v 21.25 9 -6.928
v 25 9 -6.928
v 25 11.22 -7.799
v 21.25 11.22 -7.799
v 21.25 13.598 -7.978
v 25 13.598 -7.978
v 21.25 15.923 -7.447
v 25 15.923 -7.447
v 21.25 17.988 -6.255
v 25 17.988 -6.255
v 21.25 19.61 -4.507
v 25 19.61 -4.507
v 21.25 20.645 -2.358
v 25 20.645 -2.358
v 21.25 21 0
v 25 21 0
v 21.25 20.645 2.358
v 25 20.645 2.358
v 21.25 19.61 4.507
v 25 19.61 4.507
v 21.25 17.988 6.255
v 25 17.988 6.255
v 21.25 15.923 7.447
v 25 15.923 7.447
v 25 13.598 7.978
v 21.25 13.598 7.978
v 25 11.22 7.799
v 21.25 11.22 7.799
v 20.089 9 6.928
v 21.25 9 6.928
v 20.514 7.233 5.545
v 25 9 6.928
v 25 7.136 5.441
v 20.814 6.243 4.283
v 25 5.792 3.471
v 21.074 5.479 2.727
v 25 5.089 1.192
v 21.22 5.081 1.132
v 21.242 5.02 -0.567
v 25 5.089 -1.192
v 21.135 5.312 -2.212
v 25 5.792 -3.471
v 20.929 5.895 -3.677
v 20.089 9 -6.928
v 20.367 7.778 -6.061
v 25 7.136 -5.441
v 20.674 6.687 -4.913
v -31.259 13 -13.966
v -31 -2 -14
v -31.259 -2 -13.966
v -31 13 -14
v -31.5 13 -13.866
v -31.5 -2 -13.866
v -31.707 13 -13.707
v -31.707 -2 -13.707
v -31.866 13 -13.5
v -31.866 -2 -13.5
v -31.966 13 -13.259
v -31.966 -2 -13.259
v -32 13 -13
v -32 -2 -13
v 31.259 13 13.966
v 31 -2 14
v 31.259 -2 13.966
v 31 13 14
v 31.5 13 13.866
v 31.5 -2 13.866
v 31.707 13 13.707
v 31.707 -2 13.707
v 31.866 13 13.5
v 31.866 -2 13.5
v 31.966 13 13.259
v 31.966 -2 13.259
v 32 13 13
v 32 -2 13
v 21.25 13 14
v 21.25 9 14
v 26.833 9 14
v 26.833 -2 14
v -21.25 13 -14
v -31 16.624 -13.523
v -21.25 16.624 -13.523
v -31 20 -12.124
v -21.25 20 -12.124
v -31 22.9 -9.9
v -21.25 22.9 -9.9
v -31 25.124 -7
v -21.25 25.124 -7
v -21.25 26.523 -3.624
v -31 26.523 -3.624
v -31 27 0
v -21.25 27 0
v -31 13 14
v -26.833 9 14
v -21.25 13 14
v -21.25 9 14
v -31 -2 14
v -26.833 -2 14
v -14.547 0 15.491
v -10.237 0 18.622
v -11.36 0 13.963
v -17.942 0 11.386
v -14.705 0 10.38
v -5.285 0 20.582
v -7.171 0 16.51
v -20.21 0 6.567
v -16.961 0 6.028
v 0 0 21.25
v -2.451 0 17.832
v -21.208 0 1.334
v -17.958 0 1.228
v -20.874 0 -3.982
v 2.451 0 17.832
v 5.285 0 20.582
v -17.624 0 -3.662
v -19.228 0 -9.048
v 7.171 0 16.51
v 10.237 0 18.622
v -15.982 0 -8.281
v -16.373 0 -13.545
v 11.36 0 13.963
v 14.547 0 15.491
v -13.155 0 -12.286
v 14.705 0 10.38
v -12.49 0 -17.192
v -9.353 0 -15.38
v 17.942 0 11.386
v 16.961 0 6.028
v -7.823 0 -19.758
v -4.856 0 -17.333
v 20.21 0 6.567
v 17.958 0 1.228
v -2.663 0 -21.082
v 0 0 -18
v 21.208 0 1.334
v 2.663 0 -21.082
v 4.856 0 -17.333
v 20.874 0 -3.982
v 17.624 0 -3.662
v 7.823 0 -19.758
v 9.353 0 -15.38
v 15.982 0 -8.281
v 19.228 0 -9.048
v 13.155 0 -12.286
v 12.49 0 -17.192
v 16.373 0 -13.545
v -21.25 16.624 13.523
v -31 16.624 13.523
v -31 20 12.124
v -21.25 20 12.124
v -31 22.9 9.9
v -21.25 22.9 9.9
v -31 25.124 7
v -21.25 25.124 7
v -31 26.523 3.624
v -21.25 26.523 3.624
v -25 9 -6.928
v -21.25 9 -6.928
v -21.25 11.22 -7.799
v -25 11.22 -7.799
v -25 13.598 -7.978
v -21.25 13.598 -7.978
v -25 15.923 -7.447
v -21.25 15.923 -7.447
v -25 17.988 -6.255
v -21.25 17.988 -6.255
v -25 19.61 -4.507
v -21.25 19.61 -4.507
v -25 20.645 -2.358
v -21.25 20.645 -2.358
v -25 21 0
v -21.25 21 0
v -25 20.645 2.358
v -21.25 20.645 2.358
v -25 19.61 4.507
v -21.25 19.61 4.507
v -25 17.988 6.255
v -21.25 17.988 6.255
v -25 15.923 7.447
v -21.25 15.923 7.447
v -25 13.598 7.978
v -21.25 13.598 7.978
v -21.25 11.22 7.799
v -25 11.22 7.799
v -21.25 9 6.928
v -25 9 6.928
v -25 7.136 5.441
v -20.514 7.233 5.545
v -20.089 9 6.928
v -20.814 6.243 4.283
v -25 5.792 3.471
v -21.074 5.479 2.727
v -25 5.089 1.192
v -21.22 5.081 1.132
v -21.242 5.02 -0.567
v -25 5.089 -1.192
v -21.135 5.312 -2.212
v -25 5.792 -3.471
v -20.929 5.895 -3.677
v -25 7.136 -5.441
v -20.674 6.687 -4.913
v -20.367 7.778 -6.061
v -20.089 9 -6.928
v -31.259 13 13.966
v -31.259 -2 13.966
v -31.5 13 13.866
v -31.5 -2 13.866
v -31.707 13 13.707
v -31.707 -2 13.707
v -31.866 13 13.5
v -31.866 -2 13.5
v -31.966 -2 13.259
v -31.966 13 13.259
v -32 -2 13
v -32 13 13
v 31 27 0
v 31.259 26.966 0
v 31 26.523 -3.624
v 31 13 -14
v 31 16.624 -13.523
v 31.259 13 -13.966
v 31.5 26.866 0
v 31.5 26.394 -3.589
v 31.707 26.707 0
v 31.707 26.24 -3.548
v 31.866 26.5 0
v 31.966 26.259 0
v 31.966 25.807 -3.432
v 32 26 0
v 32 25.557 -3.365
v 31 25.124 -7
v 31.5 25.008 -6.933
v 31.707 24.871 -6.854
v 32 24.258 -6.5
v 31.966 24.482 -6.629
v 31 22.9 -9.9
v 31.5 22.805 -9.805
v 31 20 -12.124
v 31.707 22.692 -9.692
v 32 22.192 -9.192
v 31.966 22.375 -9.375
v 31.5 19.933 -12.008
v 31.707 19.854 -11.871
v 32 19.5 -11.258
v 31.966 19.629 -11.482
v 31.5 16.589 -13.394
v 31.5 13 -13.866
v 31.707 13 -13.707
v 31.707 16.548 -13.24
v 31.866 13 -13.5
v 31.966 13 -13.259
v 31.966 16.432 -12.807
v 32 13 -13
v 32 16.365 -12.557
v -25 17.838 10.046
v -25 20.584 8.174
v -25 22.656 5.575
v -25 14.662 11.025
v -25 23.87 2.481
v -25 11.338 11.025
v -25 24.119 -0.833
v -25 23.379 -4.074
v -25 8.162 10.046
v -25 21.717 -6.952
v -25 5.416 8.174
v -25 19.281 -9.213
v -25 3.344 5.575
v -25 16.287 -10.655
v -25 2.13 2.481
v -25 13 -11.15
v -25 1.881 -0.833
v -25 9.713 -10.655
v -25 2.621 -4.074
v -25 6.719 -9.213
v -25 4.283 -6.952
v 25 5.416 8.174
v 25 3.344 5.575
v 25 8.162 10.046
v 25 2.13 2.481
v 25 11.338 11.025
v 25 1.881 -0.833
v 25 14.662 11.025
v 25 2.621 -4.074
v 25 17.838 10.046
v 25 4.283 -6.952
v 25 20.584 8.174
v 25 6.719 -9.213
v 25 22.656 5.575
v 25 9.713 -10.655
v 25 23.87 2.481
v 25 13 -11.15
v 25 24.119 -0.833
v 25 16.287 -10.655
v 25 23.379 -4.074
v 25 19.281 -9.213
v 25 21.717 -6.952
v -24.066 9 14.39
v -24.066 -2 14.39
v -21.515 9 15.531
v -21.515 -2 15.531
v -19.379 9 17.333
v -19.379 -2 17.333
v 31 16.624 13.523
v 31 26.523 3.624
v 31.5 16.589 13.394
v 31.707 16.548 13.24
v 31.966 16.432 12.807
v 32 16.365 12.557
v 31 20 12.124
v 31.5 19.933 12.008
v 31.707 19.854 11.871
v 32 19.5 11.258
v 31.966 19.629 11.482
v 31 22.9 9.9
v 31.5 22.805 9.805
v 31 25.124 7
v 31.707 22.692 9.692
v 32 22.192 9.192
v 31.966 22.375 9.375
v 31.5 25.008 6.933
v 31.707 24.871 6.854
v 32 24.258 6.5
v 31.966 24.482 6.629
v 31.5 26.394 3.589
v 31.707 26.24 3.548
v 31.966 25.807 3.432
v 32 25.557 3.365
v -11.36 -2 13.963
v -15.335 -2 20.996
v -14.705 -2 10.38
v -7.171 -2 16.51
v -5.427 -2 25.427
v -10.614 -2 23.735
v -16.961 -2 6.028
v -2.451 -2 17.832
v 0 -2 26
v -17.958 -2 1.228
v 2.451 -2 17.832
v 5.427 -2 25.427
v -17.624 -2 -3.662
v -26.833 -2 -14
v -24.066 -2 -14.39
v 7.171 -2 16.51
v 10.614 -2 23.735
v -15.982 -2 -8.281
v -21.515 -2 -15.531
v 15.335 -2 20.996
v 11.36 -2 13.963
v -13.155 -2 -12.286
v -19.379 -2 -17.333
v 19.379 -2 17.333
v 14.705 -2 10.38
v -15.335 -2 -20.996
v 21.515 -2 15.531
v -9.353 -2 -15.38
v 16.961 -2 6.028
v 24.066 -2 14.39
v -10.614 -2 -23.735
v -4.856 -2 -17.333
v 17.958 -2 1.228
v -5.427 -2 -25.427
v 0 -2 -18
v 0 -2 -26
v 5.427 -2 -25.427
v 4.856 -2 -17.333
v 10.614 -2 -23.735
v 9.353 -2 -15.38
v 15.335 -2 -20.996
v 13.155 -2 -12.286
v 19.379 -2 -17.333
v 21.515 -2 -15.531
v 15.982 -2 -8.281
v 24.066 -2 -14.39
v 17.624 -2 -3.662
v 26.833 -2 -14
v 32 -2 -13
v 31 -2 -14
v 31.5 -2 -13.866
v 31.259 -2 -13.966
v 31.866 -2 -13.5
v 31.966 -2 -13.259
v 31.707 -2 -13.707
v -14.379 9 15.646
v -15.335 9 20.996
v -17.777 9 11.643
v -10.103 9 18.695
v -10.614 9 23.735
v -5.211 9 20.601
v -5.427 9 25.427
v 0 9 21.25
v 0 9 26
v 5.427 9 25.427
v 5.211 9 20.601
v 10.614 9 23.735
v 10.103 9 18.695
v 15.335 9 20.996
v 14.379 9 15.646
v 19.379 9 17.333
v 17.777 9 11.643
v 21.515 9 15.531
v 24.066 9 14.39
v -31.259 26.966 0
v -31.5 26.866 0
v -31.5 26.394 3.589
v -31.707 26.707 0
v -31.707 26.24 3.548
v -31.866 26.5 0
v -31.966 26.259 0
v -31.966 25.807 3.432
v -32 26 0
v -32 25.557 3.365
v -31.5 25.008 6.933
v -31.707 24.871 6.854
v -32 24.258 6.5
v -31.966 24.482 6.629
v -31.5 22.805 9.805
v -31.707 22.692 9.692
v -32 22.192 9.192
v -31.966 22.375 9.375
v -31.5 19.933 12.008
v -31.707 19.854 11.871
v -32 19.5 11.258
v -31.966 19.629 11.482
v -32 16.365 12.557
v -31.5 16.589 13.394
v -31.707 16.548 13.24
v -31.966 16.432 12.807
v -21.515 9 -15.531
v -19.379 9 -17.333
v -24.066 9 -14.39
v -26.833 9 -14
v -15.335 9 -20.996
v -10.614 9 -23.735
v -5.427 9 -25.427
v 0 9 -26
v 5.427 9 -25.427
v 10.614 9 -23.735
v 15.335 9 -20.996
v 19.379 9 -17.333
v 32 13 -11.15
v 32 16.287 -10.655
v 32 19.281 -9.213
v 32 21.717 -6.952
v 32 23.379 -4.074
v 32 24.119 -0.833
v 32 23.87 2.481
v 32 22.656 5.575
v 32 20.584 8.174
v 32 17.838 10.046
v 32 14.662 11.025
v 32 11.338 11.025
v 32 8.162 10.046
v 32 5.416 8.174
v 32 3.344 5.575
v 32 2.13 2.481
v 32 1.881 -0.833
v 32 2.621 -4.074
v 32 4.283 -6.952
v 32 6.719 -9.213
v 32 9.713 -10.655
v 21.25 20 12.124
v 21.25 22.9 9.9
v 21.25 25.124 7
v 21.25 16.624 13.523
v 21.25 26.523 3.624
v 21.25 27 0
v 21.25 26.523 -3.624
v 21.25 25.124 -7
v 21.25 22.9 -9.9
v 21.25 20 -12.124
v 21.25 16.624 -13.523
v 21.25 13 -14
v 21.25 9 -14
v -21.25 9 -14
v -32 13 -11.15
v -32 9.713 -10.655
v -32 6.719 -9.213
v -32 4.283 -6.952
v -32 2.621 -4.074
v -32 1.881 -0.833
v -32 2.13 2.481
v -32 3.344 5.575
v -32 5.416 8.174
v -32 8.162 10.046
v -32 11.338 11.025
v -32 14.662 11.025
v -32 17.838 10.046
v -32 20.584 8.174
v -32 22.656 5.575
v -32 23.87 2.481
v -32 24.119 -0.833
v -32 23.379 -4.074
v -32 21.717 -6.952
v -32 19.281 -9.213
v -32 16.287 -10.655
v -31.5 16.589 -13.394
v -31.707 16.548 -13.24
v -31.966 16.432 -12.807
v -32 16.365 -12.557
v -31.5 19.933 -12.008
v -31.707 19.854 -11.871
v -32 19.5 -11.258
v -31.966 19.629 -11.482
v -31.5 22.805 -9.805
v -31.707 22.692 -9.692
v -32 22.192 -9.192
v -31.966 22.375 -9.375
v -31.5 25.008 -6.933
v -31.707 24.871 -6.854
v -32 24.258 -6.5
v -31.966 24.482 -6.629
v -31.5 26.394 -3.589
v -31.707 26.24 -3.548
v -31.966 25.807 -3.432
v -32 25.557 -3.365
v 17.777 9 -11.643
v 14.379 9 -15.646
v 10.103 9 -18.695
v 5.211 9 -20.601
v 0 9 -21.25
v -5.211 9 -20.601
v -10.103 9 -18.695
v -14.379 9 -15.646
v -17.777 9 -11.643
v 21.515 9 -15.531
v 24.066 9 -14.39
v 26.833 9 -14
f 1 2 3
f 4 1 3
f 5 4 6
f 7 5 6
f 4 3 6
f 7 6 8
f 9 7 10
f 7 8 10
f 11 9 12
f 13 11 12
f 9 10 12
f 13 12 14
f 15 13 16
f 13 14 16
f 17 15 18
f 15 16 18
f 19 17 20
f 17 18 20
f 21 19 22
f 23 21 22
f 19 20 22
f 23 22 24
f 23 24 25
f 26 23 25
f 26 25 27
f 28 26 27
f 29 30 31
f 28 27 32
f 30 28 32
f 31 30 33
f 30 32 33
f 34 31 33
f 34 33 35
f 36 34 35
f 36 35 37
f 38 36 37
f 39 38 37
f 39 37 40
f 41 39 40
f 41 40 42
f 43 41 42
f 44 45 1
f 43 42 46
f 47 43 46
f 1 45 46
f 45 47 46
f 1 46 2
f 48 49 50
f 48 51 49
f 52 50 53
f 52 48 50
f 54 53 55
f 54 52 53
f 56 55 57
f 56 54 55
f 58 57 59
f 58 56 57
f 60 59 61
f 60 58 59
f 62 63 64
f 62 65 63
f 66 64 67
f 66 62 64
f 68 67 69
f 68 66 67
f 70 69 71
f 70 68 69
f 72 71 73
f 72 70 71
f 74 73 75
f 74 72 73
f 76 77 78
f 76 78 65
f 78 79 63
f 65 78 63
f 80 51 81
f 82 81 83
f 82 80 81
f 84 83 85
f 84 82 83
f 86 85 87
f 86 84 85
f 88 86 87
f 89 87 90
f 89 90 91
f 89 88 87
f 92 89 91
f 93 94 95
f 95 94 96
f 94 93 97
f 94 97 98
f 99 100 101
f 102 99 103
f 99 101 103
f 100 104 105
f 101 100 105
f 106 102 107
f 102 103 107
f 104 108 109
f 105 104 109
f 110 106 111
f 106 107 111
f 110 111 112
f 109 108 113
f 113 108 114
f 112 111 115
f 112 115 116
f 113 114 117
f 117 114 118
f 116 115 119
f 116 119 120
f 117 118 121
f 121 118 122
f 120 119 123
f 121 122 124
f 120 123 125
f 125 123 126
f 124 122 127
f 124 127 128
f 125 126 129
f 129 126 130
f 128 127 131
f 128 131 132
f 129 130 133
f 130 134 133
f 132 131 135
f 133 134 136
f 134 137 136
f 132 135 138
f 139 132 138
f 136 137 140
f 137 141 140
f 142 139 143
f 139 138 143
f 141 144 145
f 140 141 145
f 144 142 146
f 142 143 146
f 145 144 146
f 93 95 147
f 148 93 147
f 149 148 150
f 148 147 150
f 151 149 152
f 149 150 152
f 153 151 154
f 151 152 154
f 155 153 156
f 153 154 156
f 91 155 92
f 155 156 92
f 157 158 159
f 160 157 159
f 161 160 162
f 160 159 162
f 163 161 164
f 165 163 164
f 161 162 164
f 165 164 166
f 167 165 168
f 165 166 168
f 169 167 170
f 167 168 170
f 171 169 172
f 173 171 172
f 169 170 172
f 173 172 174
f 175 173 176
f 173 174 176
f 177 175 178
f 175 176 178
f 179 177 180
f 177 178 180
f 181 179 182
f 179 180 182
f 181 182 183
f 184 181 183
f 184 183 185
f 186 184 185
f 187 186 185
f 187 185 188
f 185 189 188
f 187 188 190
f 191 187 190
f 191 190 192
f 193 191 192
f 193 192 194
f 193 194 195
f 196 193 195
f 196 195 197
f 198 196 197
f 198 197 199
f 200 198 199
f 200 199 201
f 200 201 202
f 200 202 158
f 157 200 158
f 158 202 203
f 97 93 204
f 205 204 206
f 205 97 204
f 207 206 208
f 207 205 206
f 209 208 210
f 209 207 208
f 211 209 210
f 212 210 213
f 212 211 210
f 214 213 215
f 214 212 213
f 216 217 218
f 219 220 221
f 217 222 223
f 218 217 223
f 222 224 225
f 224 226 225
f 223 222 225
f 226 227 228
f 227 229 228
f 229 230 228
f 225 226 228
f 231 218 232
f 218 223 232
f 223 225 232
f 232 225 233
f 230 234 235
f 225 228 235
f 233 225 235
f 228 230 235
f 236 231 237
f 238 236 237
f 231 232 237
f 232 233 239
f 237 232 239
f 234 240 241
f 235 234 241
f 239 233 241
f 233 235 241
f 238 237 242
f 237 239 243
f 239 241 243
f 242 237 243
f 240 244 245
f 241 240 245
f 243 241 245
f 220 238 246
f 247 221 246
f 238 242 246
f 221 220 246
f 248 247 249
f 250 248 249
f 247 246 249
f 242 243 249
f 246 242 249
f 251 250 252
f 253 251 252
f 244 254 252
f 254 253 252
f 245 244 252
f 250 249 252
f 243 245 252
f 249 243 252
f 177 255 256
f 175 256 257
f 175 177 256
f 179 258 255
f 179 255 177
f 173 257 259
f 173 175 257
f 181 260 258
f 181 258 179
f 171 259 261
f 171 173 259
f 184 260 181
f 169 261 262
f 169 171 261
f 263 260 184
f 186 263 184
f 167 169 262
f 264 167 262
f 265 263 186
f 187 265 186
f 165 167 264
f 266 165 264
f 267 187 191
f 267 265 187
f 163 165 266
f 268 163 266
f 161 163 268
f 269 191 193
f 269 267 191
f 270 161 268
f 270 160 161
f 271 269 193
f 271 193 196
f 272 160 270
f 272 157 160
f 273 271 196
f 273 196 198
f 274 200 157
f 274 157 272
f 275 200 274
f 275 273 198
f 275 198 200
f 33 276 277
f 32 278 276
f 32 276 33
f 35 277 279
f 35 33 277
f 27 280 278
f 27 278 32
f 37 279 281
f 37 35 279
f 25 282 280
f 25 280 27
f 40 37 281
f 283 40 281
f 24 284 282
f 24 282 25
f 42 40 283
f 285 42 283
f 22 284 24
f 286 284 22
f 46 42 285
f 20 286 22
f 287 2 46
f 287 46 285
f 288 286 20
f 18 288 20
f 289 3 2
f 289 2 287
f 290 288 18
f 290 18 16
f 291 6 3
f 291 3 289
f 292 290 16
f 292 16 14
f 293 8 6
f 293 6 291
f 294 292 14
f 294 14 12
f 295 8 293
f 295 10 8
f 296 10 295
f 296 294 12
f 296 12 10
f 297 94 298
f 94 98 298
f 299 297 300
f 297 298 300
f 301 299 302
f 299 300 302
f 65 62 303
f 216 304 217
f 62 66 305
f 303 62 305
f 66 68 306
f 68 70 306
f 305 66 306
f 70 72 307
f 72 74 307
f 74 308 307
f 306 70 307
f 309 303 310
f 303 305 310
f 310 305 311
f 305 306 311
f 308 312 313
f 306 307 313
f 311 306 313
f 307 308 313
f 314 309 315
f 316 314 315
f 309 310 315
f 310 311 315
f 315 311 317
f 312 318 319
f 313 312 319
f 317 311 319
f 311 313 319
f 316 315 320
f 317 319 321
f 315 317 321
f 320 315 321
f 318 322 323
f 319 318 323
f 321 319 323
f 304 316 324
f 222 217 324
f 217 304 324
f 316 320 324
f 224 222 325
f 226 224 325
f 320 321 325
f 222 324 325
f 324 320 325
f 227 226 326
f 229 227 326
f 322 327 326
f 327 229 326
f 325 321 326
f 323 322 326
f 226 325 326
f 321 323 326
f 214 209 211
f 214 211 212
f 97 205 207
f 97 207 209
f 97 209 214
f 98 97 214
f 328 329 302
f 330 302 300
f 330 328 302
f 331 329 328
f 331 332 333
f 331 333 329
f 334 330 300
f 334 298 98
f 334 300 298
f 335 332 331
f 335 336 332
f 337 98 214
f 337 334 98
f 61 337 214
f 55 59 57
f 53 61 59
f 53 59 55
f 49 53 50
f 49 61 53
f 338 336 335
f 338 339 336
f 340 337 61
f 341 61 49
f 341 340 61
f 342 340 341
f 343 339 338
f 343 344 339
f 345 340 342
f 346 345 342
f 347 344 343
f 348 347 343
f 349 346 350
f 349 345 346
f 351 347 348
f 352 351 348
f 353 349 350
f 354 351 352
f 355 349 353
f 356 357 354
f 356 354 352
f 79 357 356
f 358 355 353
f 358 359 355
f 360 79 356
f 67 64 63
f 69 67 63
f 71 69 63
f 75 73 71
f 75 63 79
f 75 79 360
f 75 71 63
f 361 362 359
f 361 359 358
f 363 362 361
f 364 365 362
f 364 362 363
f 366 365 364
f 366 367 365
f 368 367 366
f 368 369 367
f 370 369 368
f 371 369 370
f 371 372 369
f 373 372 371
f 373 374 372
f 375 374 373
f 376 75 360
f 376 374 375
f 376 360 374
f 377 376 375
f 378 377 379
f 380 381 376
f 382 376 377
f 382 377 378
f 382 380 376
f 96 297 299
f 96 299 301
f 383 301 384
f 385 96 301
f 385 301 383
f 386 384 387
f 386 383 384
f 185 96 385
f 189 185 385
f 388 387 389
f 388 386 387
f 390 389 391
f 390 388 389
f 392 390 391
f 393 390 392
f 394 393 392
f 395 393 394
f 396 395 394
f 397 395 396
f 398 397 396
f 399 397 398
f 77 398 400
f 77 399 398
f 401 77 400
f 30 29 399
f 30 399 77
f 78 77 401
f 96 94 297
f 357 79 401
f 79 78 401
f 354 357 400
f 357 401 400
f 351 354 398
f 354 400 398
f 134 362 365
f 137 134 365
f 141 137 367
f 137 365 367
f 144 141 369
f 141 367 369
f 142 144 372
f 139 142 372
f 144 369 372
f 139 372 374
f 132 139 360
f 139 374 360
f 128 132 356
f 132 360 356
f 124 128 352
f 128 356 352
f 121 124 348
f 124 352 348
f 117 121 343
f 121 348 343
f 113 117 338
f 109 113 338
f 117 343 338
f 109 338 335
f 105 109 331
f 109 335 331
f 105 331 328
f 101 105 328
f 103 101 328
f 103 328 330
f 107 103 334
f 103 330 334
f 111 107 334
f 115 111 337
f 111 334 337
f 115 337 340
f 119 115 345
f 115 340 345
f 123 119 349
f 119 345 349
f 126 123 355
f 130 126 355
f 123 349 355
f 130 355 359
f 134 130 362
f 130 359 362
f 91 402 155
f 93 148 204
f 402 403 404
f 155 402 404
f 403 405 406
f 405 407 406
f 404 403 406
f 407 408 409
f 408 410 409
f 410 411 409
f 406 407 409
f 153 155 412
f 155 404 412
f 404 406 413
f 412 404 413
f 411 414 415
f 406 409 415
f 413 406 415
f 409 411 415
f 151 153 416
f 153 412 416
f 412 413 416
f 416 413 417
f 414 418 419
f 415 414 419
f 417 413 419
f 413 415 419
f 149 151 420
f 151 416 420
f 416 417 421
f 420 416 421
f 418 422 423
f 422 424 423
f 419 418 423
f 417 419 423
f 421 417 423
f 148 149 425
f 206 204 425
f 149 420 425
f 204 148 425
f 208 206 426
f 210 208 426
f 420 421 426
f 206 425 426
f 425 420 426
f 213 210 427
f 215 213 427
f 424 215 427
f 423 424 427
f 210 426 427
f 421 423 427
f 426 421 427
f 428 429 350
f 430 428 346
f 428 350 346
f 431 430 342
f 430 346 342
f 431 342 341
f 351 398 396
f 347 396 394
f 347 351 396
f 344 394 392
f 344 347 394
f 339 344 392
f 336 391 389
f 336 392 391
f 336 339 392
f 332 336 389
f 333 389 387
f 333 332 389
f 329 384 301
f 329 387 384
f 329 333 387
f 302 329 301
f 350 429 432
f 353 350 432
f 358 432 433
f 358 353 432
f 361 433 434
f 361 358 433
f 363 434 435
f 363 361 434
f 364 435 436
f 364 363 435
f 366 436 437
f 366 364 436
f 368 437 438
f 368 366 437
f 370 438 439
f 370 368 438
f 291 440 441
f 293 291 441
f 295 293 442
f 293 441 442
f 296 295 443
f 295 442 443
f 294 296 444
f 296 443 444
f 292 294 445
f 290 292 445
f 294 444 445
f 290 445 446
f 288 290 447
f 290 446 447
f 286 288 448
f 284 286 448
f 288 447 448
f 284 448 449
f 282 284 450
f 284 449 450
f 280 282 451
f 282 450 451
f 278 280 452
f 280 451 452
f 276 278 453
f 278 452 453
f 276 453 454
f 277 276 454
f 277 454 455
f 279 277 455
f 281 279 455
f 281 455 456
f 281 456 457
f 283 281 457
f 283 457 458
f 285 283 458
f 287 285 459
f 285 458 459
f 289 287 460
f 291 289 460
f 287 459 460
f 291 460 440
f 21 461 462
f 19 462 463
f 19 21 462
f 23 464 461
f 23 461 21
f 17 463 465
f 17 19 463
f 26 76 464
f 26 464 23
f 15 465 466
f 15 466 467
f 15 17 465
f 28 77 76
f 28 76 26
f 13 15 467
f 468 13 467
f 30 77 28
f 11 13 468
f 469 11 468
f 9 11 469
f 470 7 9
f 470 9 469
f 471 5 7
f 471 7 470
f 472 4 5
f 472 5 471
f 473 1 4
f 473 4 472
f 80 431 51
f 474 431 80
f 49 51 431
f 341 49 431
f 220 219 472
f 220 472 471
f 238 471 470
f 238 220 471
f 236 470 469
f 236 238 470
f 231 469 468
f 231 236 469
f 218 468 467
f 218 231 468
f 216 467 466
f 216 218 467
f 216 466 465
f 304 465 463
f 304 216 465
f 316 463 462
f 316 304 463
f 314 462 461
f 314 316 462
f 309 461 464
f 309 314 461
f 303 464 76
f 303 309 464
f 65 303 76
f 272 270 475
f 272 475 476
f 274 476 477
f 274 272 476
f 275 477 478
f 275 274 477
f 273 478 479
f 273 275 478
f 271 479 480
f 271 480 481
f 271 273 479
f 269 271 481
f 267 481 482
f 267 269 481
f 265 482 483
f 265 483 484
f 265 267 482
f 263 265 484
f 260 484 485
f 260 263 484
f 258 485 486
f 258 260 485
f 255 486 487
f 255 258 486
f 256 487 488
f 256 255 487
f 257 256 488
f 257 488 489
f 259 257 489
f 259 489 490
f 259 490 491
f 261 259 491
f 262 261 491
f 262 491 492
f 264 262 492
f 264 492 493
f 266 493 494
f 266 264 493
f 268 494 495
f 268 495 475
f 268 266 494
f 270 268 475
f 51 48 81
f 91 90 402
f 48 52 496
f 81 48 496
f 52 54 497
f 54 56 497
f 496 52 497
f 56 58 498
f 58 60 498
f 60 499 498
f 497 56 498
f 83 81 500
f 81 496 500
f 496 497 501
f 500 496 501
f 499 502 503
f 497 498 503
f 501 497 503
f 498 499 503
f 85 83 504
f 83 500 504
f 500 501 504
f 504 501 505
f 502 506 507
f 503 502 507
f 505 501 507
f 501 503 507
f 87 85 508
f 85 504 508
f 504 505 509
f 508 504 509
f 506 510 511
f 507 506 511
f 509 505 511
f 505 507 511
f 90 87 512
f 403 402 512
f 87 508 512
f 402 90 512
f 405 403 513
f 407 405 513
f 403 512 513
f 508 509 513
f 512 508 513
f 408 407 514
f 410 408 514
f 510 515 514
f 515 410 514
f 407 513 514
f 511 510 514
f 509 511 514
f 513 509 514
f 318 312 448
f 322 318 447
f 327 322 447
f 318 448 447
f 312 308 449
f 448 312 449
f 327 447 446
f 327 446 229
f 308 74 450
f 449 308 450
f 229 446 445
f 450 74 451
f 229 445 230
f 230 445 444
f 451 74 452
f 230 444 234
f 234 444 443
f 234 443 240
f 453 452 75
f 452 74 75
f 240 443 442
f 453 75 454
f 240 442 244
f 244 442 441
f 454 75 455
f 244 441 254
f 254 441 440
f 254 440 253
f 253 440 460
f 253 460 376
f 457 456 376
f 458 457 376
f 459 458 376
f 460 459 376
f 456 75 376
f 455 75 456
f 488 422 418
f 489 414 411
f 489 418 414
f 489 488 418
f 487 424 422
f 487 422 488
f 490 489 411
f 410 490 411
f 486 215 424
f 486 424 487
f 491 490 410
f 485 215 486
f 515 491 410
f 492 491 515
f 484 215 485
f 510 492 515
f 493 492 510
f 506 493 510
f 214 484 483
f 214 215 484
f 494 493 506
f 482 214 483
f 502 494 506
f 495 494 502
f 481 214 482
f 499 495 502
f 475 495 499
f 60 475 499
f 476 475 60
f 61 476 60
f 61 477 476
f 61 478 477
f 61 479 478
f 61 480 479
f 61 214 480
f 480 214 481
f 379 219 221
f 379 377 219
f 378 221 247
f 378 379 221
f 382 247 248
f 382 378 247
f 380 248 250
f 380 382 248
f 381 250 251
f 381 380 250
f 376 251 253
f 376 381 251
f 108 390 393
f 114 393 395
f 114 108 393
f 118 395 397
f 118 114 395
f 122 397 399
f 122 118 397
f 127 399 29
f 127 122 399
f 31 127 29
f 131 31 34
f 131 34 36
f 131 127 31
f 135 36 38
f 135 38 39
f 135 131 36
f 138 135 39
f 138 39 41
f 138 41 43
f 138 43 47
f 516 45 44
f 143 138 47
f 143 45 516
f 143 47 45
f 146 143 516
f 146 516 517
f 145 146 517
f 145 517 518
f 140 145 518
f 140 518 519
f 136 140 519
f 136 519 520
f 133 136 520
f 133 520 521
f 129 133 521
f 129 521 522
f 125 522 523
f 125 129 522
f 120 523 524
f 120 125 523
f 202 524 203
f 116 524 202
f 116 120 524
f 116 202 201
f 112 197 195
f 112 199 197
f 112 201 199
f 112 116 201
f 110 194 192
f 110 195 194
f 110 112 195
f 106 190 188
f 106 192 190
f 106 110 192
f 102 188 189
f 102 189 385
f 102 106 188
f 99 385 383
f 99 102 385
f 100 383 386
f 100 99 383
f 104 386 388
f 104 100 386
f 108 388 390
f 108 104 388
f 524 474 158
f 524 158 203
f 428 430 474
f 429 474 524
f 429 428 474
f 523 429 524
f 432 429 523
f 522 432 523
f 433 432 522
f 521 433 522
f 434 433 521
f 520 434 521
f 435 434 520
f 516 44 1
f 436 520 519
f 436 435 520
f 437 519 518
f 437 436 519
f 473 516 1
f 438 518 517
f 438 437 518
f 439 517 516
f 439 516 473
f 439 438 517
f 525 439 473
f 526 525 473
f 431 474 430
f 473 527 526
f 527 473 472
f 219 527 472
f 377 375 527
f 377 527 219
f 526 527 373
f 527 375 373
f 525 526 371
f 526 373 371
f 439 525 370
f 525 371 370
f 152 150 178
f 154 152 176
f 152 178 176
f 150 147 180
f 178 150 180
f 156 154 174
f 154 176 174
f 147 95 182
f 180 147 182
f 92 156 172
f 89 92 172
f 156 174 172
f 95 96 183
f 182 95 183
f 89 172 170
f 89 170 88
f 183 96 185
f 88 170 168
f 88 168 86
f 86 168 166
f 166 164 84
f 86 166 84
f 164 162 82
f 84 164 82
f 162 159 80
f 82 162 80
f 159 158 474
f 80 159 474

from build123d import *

# Parameters (mm, degrees)
SKETCH1_R                       = 26
SKETCH1_R_2                     = 21.25
BOSS_EXTRUDE1_DEPTH             = 9
BOSS_EXTRUDE2_START             = 2
SKETCH2_R                       = 26
SKETCH2_R_2                     = 18
BOSS_EXTRUDE2_DEPTH             = 2
BOSS_EXTRUDE3_REACH             = 40.38
SKETCH3_W                       = 10.75
SKETCH3_H                       = 28
BOSS_EXTRUDE3_DIRECTION_2_DEPTH = 18
SKETCH4_R                       = 11.15
CUT_EXTRUDE1_DEPTH              = 7
CUT_EXTRUDE2_START              = -7
SKETCH5_R                       = 11.15
CUT_EXTRUDE2_DEPTH              = 7
SKETCH6_R                       = 8
CUT_EXTRUDE3_DEPTH              = 69.220231603
FILLET2_R                       = 14
FILLET3_R                       = 10
FILLET4_R                       = 1


with BuildPart() as part:
    # Sketch1 → Boss-Extrude1 (new body)
    with BuildSketch(Plane(origin=(0, 0, 0), x_dir=(1, 0, 0), z_dir=(0, 1, 0))):
        with Locations(Location((0, 0, 0), (0, 0, 270))):
            Circle(SKETCH1_R)
        with Locations(Location((0, 0, 0), (0, 0, 270))):
            Circle(SKETCH1_R_2, mode=Mode.SUBTRACT)
    extrude(amount=BOSS_EXTRUDE1_DEPTH)

    # Sketch2 → Boss-Extrude2 (add)
    with BuildSketch(Plane.XZ.offset(BOSS_EXTRUDE2_START)):
        with Locations(Location((0, 0, 0), (0, 0, 270))):
            Circle(SKETCH2_R)
        with Locations(Location((0, 0, 0), (0, 0, 270))):
            Circle(SKETCH2_R_2, mode=Mode.SUBTRACT)
    extrude(amount=-BOSS_EXTRUDE2_DEPTH)

    # Boss-Extrude3: up to this face of the body (flat: up to its plane)
    boss_extrude3_end = Plane(part.part.faces().sort_by_distance((0, -2, 25.264608948))[0])
    # Sketch3 → Boss-Extrude3 (add, up to the picked face)
    with BuildSketch(Plane(origin=(0, 9, 0), x_dir=(1, 0, 0), z_dir=(0, 1, 0)), mode=Mode.PRIVATE) as boss_extrude3_sk1:
        with Locations((26.625, 0)):
            Rectangle(SKETCH3_W, SKETCH3_H)
    boss_extrude3_tool1 = split(extrude(boss_extrude3_sk1.sketch, amount=-BOSS_EXTRUDE3_REACH, mode=Mode.PRIVATE), bisect_by=boss_extrude3_end, keep=Keep.BOTH, mode=Mode.PRIVATE)
    # Sketch3 → Boss-Extrude3 (add, up to the picked face)
    with BuildSketch(Plane(origin=(0, 9, 0), x_dir=(1, 0, 0), z_dir=(0, 1, 0)), mode=Mode.PRIVATE) as boss_extrude3_sk2:
        with Locations((-26.625, 0)):
            Rectangle(SKETCH3_W, SKETCH3_H)
    boss_extrude3_tool2 = split(extrude(boss_extrude3_sk2.sketch, amount=-BOSS_EXTRUDE3_REACH, mode=Mode.PRIVATE), bisect_by=boss_extrude3_end, keep=Keep.BOTH, mode=Mode.PRIVATE)
    add(boss_extrude3_tool1.solids().sort_by(Axis((26.625, 9, 0), (0, -1, 0)))[0])
    add(boss_extrude3_tool2.solids().sort_by(Axis((-26.625, 9, 0), (0, -1, 0)))[0])

    # Sketch3 → Boss-Extrude3 direction 2 (add)
    with BuildSketch(Plane(origin=(0, 9, 0), x_dir=(1, 0, 0), z_dir=(0, 1, 0))):
        with Locations((26.625, 0)):
            Rectangle(SKETCH3_W, SKETCH3_H)
        with Locations((-26.625, 0)):
            Rectangle(SKETCH3_W, SKETCH3_H)
    extrude(amount=BOSS_EXTRUDE3_DIRECTION_2_DEPTH)

    # Sketch4 → Cut-Extrude1 (cut)
    with BuildSketch(Plane(origin=(32, 0, 0), x_dir=(0, 0, -1), z_dir=(1, 0, 0))):
        with Locations((0, 13)):
            Circle(SKETCH4_R)
    extrude(amount=-CUT_EXTRUDE1_DEPTH, mode=Mode.SUBTRACT)

    # Sketch5 → Cut-Extrude2 (cut)
    with BuildSketch(Plane.ZY.offset(32).offset(CUT_EXTRUDE2_START)):
        with Locations(Location((0, 13, 0), (0, 0, 180))):
            Circle(SKETCH5_R)
    extrude(amount=CUT_EXTRUDE2_DEPTH, mode=Mode.SUBTRACT)

    # Sketch6 → Cut-Extrude3 (cut, through all)
    with BuildSketch(Plane(origin=(25, 0, 0), x_dir=(0, 0, -1), z_dir=(1, 0, 0))):
        with Locations(Location((0, 13, 0), (0, 0, 330))):
            Circle(SKETCH6_R)
    extrude(amount=-CUT_EXTRUDE3_DEPTH, mode=Mode.SUBTRACT)

    # Fillet2
    fillet2_edges = [part.edges().sort_by_distance(p)[0] for p in [
        (-26.625, 27, 14),
        (-26.625, 27, -14),
        (26.625, 27, -14),
        (26.625, 27, 14),
    ]]
    fillet(fillet2_edges, radius=FILLET2_R - 0.0001)  # a hair under: the kernel refuses the full size

    # Fillet3
    fillet3_edges = [part.edges().sort_by_distance(p)[0] for p in [
        (-21.9089023, 3.5, -14),
        (-21.9089023, 3.5, 14),
        (21.9089023, 3.5, -14),
        (21.9089023, 3.5, 14),
    ]]
    fillet(fillet3_edges, radius=FILLET3_R)

    # Fillet4
    fillet4_edges = [part.edges().sort_by_distance(p)[0] for p in [
        (-32, 5.50005, 14),
        (-32, 5.50005, -14),
        (-32, 22.899524226, -9.899524226),
        (-32, 22.899524226, 9.899524226),
        (32, 5.50005, -14),
        (32, 5.50005, 14),
        (32, 22.899524226, 9.899524226),
        (32, 22.899524226, -9.899524226),
    ]]
    fillet(fillet4_edges, radius=FILLET4_R)


solid = part.part
